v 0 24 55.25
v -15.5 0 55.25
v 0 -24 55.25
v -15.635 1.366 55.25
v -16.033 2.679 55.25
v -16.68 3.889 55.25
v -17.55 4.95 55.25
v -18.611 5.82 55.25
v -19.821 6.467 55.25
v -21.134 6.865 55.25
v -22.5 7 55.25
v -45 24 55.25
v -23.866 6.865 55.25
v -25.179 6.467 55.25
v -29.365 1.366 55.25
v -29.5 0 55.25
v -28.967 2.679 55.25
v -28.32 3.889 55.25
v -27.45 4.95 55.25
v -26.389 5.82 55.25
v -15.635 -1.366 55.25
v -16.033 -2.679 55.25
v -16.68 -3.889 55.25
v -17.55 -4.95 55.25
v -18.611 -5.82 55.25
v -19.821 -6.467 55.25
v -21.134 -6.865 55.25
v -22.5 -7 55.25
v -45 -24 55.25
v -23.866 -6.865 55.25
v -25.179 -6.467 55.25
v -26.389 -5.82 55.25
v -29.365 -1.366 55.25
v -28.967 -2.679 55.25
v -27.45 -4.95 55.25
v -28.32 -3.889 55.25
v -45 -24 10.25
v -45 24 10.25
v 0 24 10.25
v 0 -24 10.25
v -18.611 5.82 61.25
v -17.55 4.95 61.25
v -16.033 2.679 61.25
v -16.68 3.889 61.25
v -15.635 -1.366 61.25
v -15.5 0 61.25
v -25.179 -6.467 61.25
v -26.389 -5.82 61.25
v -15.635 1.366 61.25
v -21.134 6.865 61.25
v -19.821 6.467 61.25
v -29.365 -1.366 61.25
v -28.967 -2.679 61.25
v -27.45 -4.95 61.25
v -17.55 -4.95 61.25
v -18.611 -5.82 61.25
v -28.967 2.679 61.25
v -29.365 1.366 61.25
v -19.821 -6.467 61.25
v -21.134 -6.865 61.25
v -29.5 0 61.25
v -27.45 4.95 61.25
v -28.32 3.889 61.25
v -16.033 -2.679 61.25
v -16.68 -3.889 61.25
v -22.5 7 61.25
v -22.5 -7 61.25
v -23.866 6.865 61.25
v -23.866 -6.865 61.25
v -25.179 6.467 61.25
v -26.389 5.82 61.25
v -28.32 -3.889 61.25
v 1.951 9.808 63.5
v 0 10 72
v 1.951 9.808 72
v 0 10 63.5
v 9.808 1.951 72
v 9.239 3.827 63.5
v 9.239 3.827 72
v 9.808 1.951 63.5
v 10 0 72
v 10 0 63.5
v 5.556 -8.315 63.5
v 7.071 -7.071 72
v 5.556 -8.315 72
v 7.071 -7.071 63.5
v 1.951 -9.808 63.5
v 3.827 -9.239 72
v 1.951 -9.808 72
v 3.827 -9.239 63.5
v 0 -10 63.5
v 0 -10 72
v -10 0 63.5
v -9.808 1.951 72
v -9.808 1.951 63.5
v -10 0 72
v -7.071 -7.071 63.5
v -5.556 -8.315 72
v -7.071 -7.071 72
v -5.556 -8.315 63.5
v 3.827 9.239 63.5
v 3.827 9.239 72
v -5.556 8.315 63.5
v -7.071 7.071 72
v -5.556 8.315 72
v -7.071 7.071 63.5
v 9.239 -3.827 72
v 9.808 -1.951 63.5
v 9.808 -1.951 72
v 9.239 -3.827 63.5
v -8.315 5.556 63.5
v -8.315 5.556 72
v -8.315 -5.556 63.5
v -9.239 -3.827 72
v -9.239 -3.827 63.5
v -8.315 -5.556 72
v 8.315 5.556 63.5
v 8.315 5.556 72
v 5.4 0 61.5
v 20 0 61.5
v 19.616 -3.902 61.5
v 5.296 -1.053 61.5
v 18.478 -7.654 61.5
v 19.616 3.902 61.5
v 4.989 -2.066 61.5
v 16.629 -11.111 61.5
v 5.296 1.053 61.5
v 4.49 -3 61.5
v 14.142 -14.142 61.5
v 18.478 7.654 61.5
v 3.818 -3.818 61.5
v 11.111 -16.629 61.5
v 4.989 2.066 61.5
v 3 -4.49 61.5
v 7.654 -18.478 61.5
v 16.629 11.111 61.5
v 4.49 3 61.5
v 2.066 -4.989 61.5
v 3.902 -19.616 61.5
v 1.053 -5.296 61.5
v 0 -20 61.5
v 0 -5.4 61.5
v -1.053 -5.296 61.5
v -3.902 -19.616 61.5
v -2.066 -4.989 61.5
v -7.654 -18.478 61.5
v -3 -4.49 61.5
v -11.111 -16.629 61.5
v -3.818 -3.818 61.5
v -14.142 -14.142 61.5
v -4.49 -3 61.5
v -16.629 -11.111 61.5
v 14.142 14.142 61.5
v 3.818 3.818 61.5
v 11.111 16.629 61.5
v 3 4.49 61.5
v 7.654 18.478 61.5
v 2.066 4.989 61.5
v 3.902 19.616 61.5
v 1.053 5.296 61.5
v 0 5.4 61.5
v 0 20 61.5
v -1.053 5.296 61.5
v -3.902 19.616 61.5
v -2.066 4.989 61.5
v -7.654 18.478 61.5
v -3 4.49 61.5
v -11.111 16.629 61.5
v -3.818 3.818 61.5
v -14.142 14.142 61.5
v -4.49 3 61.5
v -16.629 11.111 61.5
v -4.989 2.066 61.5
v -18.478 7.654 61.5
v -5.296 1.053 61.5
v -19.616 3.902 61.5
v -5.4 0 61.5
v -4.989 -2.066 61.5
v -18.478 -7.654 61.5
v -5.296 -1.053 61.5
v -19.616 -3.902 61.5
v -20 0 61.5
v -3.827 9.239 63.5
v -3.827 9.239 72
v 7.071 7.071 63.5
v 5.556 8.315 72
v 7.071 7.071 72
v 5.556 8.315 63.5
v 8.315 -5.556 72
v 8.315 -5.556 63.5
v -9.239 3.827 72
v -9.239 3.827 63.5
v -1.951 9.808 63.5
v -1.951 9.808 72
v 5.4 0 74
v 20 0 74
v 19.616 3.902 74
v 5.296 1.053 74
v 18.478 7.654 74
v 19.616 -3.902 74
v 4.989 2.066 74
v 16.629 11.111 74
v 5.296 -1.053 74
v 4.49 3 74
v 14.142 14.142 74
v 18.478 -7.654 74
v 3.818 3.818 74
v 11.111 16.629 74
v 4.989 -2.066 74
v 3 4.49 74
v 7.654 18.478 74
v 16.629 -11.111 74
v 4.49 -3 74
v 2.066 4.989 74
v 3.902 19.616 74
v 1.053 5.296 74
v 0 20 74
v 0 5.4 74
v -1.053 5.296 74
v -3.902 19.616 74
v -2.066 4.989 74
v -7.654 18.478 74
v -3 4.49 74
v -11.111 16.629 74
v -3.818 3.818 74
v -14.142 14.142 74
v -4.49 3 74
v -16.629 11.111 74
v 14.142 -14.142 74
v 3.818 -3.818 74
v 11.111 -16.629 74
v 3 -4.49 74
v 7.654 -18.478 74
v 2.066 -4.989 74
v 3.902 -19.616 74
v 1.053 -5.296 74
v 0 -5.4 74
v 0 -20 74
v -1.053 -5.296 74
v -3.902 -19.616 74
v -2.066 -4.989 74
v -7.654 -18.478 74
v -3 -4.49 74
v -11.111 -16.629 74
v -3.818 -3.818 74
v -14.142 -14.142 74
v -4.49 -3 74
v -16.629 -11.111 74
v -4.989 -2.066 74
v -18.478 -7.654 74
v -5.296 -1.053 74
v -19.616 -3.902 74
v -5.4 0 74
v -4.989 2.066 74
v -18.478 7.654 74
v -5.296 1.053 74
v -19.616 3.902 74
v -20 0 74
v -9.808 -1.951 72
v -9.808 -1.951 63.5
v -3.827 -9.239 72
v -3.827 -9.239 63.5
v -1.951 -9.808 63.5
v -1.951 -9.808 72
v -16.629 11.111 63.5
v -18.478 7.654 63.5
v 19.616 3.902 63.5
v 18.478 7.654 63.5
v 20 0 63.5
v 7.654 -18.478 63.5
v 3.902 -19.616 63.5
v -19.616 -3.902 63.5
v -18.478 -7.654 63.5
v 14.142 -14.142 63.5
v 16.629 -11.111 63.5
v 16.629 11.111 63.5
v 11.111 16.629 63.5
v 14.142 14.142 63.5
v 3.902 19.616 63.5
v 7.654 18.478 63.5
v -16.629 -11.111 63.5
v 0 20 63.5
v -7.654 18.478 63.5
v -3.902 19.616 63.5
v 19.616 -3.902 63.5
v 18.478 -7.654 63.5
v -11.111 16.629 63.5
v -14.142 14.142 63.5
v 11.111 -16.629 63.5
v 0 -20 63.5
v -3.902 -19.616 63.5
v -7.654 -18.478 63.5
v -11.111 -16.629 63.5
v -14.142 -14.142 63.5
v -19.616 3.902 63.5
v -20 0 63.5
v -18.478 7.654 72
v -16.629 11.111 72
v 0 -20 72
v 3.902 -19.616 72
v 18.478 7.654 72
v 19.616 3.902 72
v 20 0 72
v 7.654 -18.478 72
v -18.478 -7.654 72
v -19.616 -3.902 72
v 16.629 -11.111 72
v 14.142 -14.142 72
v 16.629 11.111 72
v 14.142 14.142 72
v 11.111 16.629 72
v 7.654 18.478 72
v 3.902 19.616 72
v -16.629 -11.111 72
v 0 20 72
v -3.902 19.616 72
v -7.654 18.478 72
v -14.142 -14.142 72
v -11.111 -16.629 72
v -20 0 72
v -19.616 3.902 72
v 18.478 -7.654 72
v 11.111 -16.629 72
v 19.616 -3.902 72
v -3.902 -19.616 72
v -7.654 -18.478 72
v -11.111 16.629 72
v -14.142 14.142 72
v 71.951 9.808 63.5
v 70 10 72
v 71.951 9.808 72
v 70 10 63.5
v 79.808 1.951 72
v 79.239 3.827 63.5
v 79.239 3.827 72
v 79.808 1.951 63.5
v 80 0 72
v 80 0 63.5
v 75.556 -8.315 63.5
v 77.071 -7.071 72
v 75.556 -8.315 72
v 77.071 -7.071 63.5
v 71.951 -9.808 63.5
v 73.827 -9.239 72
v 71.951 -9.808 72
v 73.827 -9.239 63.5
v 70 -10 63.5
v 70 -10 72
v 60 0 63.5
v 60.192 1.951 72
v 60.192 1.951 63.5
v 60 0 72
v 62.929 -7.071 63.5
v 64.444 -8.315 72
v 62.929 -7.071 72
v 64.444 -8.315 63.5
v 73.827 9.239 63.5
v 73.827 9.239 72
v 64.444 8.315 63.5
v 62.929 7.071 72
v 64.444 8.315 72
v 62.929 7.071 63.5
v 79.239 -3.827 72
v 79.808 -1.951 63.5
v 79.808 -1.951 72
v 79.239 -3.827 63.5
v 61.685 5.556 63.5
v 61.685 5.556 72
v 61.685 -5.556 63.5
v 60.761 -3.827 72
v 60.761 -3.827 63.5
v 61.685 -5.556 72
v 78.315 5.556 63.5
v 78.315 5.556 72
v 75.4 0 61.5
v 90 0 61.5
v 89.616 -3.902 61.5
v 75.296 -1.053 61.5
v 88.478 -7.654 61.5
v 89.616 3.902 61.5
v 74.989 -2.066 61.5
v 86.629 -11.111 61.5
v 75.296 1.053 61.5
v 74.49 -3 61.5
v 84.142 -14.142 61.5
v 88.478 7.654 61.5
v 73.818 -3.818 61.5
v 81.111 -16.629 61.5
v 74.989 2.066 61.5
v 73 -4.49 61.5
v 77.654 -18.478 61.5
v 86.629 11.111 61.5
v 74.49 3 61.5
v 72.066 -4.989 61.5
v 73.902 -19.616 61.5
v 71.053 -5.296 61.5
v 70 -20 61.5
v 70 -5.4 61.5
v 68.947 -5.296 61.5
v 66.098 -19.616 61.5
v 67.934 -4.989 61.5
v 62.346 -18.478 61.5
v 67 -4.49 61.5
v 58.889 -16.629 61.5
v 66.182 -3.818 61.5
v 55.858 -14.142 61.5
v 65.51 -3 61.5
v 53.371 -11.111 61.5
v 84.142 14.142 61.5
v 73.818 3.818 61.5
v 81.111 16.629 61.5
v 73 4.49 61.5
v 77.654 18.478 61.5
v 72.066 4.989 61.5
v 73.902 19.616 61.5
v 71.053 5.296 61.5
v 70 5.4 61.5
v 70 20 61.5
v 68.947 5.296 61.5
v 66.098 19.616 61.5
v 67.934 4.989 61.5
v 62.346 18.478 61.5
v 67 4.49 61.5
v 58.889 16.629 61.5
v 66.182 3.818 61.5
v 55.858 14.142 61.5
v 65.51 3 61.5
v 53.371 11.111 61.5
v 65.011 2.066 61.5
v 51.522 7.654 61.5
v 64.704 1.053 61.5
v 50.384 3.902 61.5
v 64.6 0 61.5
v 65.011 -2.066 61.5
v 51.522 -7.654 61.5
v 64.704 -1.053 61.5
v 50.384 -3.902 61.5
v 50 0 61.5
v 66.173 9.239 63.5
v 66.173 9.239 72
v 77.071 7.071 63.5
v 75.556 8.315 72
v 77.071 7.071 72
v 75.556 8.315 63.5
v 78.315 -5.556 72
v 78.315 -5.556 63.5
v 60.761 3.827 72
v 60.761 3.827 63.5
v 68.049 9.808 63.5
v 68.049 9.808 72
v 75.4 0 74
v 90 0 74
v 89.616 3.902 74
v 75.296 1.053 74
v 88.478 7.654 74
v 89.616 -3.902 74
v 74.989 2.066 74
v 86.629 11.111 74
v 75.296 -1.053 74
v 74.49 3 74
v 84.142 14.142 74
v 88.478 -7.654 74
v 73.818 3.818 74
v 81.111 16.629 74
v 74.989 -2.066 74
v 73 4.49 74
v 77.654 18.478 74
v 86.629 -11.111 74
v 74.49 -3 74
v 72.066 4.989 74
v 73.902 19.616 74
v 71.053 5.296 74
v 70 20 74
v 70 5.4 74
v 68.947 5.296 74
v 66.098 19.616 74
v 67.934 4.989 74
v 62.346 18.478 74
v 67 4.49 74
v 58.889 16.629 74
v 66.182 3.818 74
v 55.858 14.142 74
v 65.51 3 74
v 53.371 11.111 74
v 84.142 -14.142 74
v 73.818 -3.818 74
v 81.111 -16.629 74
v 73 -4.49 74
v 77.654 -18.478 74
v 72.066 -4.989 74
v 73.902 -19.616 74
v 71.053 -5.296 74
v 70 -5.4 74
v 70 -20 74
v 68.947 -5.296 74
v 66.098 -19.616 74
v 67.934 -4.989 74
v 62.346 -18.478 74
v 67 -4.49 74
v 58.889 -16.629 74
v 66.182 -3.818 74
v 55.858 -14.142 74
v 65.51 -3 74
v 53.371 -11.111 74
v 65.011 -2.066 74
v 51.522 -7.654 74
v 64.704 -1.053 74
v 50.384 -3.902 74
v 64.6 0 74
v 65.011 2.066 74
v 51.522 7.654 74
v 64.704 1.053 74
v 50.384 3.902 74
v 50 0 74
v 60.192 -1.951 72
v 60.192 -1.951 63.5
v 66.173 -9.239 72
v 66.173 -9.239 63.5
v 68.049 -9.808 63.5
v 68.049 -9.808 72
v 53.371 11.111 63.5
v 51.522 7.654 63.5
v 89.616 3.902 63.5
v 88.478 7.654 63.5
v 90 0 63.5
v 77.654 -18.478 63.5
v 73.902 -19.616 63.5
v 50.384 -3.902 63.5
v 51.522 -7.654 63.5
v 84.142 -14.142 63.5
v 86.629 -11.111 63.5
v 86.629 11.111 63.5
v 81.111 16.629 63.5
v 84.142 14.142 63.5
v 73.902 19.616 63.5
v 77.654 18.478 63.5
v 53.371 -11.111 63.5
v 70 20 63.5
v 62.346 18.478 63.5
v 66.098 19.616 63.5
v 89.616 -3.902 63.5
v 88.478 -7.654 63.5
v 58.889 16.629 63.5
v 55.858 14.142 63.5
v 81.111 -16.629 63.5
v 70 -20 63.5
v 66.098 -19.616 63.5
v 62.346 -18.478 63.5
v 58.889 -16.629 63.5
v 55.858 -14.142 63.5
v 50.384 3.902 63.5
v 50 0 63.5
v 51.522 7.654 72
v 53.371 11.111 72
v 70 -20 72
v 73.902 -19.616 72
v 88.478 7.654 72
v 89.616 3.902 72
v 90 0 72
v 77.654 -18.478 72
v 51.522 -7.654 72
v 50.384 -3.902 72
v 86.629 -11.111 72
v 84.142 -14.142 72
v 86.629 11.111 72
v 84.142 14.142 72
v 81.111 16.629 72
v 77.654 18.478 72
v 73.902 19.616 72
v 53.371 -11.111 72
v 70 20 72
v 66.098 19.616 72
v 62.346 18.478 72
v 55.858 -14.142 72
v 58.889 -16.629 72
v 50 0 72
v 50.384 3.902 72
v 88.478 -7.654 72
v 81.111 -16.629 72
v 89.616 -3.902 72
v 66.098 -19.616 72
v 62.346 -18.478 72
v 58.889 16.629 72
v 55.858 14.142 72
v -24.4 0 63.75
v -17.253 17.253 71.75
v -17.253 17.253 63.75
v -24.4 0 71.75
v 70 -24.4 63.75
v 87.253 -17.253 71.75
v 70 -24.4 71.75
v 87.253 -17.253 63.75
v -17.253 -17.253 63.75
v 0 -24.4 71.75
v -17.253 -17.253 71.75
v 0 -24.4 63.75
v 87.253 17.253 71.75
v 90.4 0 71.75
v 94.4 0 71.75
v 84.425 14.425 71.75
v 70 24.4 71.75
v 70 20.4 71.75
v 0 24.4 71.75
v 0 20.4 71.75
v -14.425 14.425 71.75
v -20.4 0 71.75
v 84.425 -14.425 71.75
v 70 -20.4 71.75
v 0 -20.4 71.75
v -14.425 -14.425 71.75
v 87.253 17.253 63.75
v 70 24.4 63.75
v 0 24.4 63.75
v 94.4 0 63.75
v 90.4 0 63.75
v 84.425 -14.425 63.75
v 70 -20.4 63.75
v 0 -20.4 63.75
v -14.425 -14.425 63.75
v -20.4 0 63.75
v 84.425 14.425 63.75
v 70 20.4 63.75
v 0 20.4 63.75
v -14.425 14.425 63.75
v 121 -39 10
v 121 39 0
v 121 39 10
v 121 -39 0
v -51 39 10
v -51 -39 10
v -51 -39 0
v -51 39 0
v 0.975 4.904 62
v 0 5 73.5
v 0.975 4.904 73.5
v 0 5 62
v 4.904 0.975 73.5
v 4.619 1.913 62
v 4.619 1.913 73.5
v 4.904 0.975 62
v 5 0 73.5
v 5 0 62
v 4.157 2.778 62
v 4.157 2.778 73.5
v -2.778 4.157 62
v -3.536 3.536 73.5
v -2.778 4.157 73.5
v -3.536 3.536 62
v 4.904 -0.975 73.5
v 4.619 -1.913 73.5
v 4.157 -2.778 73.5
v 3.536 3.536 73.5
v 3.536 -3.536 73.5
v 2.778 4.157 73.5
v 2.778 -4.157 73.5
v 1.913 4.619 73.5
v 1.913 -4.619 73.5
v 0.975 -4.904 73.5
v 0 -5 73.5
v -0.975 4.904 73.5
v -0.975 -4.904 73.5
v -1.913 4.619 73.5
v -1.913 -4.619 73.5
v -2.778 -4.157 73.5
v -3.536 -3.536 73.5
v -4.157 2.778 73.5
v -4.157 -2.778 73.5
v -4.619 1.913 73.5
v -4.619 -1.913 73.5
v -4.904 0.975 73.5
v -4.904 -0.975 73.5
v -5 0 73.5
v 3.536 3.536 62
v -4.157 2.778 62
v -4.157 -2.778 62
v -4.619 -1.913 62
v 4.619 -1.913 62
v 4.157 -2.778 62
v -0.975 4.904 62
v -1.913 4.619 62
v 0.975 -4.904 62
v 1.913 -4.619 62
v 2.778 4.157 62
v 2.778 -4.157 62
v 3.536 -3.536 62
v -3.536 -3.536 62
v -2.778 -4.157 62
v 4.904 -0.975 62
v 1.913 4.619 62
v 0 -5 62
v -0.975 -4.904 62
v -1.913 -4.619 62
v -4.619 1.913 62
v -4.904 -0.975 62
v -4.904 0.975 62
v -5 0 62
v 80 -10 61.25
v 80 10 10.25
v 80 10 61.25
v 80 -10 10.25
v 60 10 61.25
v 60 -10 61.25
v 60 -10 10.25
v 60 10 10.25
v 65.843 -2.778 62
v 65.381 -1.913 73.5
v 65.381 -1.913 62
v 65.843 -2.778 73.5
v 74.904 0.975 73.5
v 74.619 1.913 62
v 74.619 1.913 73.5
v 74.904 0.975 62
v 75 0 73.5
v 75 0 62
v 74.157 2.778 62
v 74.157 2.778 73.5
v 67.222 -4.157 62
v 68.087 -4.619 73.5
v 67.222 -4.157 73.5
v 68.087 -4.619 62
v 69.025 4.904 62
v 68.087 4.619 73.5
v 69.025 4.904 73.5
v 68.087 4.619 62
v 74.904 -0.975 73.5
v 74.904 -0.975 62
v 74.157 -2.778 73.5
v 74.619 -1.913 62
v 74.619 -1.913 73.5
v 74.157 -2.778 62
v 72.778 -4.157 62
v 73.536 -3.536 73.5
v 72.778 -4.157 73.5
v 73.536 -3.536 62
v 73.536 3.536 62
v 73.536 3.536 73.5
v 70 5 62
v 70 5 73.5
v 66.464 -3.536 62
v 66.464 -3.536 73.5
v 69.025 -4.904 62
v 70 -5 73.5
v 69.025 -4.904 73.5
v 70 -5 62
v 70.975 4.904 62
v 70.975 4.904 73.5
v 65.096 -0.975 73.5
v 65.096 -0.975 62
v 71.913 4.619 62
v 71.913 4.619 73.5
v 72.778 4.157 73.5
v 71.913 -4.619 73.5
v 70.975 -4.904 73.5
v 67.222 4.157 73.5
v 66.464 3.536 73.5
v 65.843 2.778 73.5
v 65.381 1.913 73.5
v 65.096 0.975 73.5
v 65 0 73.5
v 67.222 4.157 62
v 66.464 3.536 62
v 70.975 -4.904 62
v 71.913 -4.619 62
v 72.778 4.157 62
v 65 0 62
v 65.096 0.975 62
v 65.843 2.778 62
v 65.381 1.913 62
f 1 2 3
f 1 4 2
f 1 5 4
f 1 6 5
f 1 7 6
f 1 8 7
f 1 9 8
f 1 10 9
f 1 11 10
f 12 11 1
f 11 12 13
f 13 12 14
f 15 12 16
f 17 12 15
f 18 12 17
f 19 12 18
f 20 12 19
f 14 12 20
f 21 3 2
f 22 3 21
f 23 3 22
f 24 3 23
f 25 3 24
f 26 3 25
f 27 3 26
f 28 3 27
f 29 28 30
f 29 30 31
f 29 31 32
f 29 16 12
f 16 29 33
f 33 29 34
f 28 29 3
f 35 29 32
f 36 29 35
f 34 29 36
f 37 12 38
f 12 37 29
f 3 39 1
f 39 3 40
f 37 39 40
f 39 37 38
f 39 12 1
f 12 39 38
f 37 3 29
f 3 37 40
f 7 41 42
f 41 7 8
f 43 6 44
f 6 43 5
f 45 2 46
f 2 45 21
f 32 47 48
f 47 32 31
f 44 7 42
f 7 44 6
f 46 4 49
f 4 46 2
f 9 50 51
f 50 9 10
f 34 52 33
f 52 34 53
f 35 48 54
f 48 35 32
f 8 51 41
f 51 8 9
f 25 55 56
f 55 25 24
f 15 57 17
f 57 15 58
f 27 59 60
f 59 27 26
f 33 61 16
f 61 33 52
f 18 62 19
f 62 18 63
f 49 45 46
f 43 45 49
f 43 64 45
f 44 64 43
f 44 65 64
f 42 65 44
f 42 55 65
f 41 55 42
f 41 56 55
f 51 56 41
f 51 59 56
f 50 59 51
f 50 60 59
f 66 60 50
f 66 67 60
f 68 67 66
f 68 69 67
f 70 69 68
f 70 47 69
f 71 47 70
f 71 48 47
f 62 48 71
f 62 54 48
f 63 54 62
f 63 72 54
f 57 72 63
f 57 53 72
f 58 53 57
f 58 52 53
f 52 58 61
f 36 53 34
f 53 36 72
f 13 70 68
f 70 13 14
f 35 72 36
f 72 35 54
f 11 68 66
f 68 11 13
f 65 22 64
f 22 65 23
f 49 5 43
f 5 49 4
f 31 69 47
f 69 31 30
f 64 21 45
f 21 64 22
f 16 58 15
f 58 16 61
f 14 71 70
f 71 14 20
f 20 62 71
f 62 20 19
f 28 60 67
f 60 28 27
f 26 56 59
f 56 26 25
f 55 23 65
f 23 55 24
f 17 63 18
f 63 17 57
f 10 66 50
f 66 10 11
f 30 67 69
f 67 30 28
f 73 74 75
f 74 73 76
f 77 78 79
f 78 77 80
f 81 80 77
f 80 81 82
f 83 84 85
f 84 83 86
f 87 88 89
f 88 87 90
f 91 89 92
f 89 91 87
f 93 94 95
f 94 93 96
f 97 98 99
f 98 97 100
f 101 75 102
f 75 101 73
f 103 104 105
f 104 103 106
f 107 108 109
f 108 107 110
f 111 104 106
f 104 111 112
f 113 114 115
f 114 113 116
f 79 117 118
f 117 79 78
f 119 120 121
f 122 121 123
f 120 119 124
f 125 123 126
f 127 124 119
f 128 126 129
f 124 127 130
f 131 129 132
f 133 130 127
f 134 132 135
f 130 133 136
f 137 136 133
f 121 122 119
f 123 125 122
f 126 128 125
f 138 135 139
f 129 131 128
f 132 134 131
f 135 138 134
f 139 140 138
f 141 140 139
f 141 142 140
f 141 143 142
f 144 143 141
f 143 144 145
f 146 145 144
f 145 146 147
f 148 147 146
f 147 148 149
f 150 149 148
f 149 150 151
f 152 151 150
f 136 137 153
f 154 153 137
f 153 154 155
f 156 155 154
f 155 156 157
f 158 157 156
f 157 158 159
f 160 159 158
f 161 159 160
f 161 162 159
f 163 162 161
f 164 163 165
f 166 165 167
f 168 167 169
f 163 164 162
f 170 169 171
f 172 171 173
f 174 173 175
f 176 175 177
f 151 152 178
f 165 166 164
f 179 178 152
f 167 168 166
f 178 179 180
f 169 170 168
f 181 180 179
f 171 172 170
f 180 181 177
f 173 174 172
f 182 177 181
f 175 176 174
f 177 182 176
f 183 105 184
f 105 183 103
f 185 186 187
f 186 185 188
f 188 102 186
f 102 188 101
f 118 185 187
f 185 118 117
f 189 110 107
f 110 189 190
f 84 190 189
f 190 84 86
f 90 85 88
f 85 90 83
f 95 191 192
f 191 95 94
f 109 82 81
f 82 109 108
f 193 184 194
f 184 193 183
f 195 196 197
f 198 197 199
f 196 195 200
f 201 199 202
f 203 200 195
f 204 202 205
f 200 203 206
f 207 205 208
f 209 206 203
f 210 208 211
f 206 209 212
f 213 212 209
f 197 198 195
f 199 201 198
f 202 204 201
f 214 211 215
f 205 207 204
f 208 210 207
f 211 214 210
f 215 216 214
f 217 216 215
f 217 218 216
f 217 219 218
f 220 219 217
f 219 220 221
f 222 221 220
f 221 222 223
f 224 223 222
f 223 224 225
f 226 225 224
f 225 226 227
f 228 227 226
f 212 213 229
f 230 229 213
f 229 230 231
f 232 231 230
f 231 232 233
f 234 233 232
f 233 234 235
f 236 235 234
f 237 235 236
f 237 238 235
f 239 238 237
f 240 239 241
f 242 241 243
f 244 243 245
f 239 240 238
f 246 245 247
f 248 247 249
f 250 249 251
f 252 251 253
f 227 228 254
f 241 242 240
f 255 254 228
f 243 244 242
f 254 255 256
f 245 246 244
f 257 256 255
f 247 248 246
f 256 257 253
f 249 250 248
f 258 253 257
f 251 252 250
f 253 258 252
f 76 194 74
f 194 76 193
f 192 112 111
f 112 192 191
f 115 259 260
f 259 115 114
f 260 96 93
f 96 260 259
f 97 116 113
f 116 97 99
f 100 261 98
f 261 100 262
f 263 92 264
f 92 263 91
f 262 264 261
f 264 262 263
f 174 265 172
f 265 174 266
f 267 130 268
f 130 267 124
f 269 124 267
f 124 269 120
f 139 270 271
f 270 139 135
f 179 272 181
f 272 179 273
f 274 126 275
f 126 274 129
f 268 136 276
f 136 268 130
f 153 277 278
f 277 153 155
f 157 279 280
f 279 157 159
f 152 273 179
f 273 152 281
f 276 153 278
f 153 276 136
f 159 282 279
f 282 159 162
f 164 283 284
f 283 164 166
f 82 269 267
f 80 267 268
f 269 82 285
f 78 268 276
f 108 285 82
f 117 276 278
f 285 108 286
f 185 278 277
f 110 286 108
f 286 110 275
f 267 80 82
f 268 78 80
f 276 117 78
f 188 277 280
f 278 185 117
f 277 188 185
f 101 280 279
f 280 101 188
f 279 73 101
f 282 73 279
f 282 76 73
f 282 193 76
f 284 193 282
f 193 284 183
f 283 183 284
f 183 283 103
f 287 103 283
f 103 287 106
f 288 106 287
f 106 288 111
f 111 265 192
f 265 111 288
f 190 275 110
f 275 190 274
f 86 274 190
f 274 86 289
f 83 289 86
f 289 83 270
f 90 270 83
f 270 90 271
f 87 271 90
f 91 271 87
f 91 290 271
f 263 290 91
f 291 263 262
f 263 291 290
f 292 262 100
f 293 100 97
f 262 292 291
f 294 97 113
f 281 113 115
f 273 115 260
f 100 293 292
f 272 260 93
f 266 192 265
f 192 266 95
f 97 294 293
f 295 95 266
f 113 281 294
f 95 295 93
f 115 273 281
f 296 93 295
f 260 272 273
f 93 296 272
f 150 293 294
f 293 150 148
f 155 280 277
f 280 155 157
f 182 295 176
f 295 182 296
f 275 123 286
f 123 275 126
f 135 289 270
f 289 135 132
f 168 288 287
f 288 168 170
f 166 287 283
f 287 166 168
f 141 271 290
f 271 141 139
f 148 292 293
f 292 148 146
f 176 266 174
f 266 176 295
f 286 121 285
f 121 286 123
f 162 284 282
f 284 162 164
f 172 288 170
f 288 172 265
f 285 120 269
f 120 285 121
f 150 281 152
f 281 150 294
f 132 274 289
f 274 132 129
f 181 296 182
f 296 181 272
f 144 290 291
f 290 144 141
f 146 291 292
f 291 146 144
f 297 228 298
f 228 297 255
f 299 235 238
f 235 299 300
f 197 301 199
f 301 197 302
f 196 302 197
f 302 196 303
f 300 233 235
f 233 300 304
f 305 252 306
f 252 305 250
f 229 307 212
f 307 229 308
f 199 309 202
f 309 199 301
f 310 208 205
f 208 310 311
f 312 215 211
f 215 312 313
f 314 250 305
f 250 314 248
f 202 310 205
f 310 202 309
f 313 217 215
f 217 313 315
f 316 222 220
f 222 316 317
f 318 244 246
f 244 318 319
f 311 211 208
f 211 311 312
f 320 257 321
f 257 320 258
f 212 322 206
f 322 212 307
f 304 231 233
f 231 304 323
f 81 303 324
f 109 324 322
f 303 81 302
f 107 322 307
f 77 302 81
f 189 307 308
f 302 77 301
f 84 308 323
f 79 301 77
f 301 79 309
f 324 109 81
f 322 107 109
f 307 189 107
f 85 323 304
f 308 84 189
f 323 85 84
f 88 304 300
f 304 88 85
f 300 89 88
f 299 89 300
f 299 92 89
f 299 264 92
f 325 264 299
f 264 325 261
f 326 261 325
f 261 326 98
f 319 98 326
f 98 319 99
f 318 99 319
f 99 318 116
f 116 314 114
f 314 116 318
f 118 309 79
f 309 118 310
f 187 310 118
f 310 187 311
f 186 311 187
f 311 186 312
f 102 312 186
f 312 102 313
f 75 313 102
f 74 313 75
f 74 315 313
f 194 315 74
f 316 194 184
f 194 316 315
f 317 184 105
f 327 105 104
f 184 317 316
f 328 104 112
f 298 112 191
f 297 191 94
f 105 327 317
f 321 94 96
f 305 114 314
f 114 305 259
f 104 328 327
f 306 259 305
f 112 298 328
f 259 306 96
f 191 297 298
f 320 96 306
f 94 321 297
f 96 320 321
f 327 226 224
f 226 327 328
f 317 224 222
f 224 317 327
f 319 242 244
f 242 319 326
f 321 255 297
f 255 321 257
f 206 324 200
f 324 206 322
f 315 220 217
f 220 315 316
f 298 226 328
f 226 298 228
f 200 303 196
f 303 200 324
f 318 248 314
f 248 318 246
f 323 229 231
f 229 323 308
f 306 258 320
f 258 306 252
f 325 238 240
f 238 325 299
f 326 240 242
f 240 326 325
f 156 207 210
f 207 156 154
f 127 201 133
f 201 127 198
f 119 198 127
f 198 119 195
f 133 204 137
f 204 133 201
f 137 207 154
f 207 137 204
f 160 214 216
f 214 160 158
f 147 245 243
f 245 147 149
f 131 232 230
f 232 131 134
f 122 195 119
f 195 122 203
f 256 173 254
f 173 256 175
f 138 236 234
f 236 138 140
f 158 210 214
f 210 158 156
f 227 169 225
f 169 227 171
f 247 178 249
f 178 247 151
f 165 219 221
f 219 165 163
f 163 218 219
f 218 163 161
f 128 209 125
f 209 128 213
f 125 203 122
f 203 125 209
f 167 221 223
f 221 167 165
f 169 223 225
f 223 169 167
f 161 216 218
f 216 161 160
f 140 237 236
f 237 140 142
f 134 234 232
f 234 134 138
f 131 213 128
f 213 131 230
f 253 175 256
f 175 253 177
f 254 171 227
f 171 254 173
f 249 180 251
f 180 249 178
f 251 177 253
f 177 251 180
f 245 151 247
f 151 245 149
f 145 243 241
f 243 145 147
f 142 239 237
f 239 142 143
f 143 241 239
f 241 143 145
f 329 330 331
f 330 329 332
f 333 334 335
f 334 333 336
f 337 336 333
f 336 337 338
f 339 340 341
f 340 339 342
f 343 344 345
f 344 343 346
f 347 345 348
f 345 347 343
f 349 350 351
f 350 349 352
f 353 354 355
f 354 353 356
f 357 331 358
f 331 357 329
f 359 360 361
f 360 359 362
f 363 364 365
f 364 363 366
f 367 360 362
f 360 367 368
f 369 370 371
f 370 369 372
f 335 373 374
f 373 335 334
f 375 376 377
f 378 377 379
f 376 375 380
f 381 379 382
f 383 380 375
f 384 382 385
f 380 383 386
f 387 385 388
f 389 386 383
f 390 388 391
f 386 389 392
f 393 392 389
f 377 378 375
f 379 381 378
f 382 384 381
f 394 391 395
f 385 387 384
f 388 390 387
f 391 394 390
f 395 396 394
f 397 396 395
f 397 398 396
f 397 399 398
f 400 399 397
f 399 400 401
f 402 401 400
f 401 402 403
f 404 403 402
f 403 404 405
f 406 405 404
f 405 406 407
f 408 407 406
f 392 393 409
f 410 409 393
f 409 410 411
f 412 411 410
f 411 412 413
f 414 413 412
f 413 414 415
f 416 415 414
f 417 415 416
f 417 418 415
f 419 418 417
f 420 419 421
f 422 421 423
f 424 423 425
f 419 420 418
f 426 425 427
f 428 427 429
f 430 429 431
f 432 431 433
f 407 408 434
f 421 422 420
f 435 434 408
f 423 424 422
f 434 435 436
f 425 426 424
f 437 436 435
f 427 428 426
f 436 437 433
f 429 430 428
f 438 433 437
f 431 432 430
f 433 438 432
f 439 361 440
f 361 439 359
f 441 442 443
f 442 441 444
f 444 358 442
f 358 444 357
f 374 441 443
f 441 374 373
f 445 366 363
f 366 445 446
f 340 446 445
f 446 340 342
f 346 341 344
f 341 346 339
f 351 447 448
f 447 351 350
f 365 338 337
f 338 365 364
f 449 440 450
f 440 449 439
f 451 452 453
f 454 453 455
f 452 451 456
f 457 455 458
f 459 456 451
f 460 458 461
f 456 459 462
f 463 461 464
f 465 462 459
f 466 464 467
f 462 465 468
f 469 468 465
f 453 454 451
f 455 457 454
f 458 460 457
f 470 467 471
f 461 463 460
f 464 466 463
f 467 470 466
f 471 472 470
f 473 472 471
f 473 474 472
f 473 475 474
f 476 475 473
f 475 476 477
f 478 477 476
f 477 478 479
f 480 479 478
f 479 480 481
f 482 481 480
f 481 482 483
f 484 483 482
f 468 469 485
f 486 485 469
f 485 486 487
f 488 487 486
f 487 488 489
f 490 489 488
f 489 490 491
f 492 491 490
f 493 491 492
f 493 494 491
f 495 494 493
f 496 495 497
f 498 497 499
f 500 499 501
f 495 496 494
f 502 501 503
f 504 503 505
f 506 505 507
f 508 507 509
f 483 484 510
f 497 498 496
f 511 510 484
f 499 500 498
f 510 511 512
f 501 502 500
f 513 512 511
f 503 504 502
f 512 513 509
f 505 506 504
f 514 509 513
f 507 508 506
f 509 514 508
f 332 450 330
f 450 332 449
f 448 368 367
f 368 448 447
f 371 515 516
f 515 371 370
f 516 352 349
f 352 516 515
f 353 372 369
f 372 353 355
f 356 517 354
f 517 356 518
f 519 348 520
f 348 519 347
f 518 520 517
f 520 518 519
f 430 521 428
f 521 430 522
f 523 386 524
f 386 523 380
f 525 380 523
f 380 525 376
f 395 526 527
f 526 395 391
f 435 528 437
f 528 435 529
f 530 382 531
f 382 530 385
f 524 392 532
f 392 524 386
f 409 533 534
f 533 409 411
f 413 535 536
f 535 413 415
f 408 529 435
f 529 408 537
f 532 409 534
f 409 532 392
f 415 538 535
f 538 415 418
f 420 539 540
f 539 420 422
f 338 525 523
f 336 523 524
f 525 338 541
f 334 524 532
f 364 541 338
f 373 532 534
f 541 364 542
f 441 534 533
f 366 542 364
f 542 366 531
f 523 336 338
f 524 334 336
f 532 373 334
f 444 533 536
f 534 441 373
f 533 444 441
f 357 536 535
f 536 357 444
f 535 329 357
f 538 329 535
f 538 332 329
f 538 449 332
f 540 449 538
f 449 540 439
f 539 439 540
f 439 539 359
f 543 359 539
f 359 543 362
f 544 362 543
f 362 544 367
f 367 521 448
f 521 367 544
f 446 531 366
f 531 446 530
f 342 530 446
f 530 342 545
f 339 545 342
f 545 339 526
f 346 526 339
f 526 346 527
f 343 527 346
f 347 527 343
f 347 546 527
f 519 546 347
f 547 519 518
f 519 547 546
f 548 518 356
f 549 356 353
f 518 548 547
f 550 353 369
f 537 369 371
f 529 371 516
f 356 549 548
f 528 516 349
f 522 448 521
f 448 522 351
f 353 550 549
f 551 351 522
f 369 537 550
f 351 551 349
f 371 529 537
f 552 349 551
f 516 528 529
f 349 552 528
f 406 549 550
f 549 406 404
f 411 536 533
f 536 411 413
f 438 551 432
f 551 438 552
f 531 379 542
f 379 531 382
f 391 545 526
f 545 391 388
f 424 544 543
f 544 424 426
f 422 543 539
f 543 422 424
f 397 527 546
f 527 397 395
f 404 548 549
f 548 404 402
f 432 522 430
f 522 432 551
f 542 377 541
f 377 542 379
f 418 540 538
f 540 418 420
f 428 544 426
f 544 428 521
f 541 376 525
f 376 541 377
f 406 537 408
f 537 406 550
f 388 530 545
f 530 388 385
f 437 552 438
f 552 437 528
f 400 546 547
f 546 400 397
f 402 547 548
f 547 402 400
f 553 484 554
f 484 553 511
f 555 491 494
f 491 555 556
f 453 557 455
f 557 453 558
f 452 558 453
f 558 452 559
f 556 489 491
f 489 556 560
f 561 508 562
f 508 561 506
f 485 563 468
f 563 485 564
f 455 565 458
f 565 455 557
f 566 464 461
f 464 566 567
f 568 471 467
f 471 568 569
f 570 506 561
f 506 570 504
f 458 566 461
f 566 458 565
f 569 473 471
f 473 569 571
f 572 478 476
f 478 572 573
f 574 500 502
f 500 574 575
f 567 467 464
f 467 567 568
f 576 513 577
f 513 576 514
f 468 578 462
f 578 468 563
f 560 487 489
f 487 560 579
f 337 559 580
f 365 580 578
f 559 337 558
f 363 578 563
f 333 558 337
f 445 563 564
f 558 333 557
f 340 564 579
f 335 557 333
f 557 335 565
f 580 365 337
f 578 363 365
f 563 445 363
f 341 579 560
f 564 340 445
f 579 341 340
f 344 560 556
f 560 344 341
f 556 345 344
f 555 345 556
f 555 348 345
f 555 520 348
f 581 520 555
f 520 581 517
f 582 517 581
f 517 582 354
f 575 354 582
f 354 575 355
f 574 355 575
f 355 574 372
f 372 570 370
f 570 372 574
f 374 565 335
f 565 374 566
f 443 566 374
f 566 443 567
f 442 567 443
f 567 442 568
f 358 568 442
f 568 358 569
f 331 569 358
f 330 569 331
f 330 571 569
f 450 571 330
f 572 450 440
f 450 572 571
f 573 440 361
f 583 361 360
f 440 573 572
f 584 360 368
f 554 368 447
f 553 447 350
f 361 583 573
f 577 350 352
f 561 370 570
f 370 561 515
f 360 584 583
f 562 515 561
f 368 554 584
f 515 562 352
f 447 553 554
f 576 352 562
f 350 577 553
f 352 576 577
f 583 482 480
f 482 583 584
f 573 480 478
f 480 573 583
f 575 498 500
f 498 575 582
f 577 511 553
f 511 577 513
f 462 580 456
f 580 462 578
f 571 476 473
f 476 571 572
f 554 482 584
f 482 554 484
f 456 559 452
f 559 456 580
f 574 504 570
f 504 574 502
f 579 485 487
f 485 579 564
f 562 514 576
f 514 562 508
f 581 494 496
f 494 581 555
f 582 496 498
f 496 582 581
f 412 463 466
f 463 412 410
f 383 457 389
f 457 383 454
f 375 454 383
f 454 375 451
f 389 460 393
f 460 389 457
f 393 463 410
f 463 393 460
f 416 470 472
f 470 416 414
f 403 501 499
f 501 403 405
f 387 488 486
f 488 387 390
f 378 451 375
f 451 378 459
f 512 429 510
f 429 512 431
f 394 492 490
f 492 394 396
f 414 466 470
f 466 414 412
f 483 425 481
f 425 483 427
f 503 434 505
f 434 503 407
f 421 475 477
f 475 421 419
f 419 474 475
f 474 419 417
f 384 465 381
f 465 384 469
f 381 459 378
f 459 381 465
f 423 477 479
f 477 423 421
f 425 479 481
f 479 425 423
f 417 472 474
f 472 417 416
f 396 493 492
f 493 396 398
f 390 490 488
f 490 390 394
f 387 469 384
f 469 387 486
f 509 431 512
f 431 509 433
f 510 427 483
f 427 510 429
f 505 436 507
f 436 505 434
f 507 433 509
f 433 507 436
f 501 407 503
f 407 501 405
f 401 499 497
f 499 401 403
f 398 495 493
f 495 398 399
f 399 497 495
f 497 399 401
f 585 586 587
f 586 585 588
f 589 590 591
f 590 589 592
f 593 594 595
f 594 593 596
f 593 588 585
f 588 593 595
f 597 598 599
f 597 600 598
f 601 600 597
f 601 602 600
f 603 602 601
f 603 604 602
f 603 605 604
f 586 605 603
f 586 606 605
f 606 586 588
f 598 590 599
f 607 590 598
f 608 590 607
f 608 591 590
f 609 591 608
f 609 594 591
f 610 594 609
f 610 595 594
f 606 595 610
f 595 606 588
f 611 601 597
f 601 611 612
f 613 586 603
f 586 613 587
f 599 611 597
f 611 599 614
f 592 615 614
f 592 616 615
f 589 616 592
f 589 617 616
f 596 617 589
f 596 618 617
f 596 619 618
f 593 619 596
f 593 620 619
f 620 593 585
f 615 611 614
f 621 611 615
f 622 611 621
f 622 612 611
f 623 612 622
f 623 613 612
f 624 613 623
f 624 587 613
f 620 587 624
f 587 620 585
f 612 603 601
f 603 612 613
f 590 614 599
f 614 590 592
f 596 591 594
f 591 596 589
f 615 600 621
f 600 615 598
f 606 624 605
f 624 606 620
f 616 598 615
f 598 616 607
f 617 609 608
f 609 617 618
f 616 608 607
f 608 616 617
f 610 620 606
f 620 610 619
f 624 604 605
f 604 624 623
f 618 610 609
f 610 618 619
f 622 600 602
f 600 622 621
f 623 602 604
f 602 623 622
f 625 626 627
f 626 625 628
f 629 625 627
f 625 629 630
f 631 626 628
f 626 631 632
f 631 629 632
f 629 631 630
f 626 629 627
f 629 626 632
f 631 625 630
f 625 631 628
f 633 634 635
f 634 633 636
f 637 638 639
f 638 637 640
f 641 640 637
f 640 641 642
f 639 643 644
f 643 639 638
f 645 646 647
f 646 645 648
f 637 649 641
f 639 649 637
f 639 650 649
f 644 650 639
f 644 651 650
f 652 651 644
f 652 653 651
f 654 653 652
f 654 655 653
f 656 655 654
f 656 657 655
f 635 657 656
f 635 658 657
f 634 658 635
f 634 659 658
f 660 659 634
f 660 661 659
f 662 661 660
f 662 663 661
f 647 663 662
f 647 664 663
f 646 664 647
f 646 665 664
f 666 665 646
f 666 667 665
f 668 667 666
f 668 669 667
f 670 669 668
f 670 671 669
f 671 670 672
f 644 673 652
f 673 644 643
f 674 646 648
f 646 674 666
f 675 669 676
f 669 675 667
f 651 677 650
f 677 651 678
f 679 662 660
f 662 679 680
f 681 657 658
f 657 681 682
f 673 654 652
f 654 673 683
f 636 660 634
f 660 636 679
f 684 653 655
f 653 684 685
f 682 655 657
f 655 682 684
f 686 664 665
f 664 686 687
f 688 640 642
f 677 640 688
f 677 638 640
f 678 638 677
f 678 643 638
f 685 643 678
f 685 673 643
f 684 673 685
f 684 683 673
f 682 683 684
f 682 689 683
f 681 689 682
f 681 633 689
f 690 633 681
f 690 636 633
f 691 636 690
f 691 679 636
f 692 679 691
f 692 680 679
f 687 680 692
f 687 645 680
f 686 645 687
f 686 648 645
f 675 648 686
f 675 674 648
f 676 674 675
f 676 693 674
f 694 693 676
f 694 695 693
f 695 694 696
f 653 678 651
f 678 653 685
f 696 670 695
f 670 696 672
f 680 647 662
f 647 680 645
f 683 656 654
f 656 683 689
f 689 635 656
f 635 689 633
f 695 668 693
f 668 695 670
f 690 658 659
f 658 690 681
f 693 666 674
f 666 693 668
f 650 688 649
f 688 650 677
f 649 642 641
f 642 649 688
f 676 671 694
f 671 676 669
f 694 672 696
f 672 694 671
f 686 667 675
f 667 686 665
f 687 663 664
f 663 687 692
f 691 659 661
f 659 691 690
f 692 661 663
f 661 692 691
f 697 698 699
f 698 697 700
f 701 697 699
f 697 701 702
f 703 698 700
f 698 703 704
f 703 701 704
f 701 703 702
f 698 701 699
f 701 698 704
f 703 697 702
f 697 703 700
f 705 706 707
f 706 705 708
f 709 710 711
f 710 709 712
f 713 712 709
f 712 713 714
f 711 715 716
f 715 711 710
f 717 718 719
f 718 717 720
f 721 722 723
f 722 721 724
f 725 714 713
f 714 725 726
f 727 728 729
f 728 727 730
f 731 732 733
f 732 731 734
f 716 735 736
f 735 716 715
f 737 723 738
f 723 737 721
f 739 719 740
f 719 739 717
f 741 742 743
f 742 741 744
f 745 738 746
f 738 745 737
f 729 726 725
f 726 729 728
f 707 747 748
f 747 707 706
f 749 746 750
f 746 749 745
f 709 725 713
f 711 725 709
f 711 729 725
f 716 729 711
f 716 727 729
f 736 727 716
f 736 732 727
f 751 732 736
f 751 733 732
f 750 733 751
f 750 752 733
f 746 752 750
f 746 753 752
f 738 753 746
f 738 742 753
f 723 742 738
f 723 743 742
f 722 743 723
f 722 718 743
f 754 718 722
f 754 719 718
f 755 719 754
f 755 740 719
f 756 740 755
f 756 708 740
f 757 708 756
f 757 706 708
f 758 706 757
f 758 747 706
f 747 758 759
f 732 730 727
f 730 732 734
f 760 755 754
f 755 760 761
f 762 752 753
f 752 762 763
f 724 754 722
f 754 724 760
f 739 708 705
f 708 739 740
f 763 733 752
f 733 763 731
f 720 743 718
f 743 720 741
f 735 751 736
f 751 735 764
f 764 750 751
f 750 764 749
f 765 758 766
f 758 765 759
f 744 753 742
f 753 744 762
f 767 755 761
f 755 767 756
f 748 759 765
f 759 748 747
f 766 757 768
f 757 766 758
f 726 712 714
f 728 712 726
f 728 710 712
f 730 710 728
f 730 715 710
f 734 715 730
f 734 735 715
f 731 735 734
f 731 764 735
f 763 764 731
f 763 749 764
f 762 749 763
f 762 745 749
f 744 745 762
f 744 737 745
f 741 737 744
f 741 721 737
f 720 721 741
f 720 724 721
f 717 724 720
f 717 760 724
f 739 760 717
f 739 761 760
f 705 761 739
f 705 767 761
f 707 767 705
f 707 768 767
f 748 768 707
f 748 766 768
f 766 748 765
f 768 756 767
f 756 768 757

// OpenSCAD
$fn = 32;

// ------------------------------------------------------------------------
// Motor belt drive: span 70 mm, pulleys d40, belt 8 mm wide
// Every part is its own module, assembly() places every instance.
// ------------------------------------------------------------------------

// --- part 1 ---
module base_plate() {
  difference() {
    translate([-86, -39, 0]) cube([172, 78, 10]);
  }
}

// --- part 2 ---
module motor() {
  union() {
    translate([-22.5, -24, 0]) cube([45, 48, 45]);
    translate([25.5, 0, 22.5]) rotate([0, 90, 0]) cylinder(h = 6, d = 14, center = true);
  }
}

// --- part 3 ---
module drive_shaft() {
  translate([0, 0, -5.75]) cylinder(h = 11.5, d = 10);
}

// --- part 4 ---
module pulley_drive() {
  difference() {
    union() {
      cylinder(h = 12.5, d = 20);
      cylinder(h = 2, d = 40);
      translate([0, 0, 10.5]) cylinder(h = 2, d = 40);
    }
    translate([0, 0, -1]) cylinder(h = 14.5, d = 10.8);
  }
}

// --- part 5 ---
module idler_post() {
  translate([-10, -10, 0]) cube([20, 20, 51]);
}

// --- part 6 ---
module driven_shaft() {
  translate([0, 0, -5.75]) cylinder(h = 11.5, d = 10);
}

// --- part 7 ---
module pulley_driven() {
  difference() {
    union() {
      cylinder(h = 12.5, d = 20);
      cylinder(h = 2, d = 40);
      translate([0, 0, 10.5]) cylinder(h = 2, d = 40);
    }
    translate([0, 0, -1]) cylinder(h = 14.5, d = 10.8);
  }
}

// --- part 8 ---
module drive_belt() {
  difference() {
    linear_extrude(height = 8) polygon(points = concat([for (a = [90 : 45 : 270]) [24.4 * cos(a), 24.4 * sin(a)]], [for (a = [270 : 45 : 450]) [70 + 24.4 * cos(a), 24.4 * sin(a)]]));
    translate([0, 0, -1]) linear_extrude(height = 10) polygon(points = concat([for (a = [90 : 45 : 270]) [20.4 * cos(a), 20.4 * sin(a)]], [for (a = [270 : 45 : 450]) [70 + 20.4 * cos(a), 20.4 * sin(a)]]));
  }
}

// --- assembly ---
module assembly() {
  color([0.80, 0.24, 0.20]) translate([35, 0, 0]) rotate([0, 0, 0]) base_plate();
  color([0.20, 0.45, 0.75]) translate([0, 0, 32.75]) rotate([0, 270, 0]) motor();
  color([0.25, 0.62, 0.32]) translate([0, 0, 67.75]) rotate([0, 0, 0]) drive_shaft();
  color([0.92, 0.70, 0.18]) translate([0, 0, 61.5]) rotate([0, 0, 0]) pulley_drive();
  color([0.58, 0.35, 0.70]) translate([70, 0, 10.25]) rotate([0, 0, 0]) idler_post();
  color([0.16, 0.66, 0.66]) translate([70, 0, 67.75]) rotate([0, 0, 0]) driven_shaft();
  color([0.85, 0.48, 0.18]) translate([70, 0, 61.5]) rotate([0, 0, 0]) pulley_driven();
  color([0.55, 0.60, 0.65]) translate([0, 0, 63.75]) rotate([0, 0, 0]) drive_belt();
}

assembly();
